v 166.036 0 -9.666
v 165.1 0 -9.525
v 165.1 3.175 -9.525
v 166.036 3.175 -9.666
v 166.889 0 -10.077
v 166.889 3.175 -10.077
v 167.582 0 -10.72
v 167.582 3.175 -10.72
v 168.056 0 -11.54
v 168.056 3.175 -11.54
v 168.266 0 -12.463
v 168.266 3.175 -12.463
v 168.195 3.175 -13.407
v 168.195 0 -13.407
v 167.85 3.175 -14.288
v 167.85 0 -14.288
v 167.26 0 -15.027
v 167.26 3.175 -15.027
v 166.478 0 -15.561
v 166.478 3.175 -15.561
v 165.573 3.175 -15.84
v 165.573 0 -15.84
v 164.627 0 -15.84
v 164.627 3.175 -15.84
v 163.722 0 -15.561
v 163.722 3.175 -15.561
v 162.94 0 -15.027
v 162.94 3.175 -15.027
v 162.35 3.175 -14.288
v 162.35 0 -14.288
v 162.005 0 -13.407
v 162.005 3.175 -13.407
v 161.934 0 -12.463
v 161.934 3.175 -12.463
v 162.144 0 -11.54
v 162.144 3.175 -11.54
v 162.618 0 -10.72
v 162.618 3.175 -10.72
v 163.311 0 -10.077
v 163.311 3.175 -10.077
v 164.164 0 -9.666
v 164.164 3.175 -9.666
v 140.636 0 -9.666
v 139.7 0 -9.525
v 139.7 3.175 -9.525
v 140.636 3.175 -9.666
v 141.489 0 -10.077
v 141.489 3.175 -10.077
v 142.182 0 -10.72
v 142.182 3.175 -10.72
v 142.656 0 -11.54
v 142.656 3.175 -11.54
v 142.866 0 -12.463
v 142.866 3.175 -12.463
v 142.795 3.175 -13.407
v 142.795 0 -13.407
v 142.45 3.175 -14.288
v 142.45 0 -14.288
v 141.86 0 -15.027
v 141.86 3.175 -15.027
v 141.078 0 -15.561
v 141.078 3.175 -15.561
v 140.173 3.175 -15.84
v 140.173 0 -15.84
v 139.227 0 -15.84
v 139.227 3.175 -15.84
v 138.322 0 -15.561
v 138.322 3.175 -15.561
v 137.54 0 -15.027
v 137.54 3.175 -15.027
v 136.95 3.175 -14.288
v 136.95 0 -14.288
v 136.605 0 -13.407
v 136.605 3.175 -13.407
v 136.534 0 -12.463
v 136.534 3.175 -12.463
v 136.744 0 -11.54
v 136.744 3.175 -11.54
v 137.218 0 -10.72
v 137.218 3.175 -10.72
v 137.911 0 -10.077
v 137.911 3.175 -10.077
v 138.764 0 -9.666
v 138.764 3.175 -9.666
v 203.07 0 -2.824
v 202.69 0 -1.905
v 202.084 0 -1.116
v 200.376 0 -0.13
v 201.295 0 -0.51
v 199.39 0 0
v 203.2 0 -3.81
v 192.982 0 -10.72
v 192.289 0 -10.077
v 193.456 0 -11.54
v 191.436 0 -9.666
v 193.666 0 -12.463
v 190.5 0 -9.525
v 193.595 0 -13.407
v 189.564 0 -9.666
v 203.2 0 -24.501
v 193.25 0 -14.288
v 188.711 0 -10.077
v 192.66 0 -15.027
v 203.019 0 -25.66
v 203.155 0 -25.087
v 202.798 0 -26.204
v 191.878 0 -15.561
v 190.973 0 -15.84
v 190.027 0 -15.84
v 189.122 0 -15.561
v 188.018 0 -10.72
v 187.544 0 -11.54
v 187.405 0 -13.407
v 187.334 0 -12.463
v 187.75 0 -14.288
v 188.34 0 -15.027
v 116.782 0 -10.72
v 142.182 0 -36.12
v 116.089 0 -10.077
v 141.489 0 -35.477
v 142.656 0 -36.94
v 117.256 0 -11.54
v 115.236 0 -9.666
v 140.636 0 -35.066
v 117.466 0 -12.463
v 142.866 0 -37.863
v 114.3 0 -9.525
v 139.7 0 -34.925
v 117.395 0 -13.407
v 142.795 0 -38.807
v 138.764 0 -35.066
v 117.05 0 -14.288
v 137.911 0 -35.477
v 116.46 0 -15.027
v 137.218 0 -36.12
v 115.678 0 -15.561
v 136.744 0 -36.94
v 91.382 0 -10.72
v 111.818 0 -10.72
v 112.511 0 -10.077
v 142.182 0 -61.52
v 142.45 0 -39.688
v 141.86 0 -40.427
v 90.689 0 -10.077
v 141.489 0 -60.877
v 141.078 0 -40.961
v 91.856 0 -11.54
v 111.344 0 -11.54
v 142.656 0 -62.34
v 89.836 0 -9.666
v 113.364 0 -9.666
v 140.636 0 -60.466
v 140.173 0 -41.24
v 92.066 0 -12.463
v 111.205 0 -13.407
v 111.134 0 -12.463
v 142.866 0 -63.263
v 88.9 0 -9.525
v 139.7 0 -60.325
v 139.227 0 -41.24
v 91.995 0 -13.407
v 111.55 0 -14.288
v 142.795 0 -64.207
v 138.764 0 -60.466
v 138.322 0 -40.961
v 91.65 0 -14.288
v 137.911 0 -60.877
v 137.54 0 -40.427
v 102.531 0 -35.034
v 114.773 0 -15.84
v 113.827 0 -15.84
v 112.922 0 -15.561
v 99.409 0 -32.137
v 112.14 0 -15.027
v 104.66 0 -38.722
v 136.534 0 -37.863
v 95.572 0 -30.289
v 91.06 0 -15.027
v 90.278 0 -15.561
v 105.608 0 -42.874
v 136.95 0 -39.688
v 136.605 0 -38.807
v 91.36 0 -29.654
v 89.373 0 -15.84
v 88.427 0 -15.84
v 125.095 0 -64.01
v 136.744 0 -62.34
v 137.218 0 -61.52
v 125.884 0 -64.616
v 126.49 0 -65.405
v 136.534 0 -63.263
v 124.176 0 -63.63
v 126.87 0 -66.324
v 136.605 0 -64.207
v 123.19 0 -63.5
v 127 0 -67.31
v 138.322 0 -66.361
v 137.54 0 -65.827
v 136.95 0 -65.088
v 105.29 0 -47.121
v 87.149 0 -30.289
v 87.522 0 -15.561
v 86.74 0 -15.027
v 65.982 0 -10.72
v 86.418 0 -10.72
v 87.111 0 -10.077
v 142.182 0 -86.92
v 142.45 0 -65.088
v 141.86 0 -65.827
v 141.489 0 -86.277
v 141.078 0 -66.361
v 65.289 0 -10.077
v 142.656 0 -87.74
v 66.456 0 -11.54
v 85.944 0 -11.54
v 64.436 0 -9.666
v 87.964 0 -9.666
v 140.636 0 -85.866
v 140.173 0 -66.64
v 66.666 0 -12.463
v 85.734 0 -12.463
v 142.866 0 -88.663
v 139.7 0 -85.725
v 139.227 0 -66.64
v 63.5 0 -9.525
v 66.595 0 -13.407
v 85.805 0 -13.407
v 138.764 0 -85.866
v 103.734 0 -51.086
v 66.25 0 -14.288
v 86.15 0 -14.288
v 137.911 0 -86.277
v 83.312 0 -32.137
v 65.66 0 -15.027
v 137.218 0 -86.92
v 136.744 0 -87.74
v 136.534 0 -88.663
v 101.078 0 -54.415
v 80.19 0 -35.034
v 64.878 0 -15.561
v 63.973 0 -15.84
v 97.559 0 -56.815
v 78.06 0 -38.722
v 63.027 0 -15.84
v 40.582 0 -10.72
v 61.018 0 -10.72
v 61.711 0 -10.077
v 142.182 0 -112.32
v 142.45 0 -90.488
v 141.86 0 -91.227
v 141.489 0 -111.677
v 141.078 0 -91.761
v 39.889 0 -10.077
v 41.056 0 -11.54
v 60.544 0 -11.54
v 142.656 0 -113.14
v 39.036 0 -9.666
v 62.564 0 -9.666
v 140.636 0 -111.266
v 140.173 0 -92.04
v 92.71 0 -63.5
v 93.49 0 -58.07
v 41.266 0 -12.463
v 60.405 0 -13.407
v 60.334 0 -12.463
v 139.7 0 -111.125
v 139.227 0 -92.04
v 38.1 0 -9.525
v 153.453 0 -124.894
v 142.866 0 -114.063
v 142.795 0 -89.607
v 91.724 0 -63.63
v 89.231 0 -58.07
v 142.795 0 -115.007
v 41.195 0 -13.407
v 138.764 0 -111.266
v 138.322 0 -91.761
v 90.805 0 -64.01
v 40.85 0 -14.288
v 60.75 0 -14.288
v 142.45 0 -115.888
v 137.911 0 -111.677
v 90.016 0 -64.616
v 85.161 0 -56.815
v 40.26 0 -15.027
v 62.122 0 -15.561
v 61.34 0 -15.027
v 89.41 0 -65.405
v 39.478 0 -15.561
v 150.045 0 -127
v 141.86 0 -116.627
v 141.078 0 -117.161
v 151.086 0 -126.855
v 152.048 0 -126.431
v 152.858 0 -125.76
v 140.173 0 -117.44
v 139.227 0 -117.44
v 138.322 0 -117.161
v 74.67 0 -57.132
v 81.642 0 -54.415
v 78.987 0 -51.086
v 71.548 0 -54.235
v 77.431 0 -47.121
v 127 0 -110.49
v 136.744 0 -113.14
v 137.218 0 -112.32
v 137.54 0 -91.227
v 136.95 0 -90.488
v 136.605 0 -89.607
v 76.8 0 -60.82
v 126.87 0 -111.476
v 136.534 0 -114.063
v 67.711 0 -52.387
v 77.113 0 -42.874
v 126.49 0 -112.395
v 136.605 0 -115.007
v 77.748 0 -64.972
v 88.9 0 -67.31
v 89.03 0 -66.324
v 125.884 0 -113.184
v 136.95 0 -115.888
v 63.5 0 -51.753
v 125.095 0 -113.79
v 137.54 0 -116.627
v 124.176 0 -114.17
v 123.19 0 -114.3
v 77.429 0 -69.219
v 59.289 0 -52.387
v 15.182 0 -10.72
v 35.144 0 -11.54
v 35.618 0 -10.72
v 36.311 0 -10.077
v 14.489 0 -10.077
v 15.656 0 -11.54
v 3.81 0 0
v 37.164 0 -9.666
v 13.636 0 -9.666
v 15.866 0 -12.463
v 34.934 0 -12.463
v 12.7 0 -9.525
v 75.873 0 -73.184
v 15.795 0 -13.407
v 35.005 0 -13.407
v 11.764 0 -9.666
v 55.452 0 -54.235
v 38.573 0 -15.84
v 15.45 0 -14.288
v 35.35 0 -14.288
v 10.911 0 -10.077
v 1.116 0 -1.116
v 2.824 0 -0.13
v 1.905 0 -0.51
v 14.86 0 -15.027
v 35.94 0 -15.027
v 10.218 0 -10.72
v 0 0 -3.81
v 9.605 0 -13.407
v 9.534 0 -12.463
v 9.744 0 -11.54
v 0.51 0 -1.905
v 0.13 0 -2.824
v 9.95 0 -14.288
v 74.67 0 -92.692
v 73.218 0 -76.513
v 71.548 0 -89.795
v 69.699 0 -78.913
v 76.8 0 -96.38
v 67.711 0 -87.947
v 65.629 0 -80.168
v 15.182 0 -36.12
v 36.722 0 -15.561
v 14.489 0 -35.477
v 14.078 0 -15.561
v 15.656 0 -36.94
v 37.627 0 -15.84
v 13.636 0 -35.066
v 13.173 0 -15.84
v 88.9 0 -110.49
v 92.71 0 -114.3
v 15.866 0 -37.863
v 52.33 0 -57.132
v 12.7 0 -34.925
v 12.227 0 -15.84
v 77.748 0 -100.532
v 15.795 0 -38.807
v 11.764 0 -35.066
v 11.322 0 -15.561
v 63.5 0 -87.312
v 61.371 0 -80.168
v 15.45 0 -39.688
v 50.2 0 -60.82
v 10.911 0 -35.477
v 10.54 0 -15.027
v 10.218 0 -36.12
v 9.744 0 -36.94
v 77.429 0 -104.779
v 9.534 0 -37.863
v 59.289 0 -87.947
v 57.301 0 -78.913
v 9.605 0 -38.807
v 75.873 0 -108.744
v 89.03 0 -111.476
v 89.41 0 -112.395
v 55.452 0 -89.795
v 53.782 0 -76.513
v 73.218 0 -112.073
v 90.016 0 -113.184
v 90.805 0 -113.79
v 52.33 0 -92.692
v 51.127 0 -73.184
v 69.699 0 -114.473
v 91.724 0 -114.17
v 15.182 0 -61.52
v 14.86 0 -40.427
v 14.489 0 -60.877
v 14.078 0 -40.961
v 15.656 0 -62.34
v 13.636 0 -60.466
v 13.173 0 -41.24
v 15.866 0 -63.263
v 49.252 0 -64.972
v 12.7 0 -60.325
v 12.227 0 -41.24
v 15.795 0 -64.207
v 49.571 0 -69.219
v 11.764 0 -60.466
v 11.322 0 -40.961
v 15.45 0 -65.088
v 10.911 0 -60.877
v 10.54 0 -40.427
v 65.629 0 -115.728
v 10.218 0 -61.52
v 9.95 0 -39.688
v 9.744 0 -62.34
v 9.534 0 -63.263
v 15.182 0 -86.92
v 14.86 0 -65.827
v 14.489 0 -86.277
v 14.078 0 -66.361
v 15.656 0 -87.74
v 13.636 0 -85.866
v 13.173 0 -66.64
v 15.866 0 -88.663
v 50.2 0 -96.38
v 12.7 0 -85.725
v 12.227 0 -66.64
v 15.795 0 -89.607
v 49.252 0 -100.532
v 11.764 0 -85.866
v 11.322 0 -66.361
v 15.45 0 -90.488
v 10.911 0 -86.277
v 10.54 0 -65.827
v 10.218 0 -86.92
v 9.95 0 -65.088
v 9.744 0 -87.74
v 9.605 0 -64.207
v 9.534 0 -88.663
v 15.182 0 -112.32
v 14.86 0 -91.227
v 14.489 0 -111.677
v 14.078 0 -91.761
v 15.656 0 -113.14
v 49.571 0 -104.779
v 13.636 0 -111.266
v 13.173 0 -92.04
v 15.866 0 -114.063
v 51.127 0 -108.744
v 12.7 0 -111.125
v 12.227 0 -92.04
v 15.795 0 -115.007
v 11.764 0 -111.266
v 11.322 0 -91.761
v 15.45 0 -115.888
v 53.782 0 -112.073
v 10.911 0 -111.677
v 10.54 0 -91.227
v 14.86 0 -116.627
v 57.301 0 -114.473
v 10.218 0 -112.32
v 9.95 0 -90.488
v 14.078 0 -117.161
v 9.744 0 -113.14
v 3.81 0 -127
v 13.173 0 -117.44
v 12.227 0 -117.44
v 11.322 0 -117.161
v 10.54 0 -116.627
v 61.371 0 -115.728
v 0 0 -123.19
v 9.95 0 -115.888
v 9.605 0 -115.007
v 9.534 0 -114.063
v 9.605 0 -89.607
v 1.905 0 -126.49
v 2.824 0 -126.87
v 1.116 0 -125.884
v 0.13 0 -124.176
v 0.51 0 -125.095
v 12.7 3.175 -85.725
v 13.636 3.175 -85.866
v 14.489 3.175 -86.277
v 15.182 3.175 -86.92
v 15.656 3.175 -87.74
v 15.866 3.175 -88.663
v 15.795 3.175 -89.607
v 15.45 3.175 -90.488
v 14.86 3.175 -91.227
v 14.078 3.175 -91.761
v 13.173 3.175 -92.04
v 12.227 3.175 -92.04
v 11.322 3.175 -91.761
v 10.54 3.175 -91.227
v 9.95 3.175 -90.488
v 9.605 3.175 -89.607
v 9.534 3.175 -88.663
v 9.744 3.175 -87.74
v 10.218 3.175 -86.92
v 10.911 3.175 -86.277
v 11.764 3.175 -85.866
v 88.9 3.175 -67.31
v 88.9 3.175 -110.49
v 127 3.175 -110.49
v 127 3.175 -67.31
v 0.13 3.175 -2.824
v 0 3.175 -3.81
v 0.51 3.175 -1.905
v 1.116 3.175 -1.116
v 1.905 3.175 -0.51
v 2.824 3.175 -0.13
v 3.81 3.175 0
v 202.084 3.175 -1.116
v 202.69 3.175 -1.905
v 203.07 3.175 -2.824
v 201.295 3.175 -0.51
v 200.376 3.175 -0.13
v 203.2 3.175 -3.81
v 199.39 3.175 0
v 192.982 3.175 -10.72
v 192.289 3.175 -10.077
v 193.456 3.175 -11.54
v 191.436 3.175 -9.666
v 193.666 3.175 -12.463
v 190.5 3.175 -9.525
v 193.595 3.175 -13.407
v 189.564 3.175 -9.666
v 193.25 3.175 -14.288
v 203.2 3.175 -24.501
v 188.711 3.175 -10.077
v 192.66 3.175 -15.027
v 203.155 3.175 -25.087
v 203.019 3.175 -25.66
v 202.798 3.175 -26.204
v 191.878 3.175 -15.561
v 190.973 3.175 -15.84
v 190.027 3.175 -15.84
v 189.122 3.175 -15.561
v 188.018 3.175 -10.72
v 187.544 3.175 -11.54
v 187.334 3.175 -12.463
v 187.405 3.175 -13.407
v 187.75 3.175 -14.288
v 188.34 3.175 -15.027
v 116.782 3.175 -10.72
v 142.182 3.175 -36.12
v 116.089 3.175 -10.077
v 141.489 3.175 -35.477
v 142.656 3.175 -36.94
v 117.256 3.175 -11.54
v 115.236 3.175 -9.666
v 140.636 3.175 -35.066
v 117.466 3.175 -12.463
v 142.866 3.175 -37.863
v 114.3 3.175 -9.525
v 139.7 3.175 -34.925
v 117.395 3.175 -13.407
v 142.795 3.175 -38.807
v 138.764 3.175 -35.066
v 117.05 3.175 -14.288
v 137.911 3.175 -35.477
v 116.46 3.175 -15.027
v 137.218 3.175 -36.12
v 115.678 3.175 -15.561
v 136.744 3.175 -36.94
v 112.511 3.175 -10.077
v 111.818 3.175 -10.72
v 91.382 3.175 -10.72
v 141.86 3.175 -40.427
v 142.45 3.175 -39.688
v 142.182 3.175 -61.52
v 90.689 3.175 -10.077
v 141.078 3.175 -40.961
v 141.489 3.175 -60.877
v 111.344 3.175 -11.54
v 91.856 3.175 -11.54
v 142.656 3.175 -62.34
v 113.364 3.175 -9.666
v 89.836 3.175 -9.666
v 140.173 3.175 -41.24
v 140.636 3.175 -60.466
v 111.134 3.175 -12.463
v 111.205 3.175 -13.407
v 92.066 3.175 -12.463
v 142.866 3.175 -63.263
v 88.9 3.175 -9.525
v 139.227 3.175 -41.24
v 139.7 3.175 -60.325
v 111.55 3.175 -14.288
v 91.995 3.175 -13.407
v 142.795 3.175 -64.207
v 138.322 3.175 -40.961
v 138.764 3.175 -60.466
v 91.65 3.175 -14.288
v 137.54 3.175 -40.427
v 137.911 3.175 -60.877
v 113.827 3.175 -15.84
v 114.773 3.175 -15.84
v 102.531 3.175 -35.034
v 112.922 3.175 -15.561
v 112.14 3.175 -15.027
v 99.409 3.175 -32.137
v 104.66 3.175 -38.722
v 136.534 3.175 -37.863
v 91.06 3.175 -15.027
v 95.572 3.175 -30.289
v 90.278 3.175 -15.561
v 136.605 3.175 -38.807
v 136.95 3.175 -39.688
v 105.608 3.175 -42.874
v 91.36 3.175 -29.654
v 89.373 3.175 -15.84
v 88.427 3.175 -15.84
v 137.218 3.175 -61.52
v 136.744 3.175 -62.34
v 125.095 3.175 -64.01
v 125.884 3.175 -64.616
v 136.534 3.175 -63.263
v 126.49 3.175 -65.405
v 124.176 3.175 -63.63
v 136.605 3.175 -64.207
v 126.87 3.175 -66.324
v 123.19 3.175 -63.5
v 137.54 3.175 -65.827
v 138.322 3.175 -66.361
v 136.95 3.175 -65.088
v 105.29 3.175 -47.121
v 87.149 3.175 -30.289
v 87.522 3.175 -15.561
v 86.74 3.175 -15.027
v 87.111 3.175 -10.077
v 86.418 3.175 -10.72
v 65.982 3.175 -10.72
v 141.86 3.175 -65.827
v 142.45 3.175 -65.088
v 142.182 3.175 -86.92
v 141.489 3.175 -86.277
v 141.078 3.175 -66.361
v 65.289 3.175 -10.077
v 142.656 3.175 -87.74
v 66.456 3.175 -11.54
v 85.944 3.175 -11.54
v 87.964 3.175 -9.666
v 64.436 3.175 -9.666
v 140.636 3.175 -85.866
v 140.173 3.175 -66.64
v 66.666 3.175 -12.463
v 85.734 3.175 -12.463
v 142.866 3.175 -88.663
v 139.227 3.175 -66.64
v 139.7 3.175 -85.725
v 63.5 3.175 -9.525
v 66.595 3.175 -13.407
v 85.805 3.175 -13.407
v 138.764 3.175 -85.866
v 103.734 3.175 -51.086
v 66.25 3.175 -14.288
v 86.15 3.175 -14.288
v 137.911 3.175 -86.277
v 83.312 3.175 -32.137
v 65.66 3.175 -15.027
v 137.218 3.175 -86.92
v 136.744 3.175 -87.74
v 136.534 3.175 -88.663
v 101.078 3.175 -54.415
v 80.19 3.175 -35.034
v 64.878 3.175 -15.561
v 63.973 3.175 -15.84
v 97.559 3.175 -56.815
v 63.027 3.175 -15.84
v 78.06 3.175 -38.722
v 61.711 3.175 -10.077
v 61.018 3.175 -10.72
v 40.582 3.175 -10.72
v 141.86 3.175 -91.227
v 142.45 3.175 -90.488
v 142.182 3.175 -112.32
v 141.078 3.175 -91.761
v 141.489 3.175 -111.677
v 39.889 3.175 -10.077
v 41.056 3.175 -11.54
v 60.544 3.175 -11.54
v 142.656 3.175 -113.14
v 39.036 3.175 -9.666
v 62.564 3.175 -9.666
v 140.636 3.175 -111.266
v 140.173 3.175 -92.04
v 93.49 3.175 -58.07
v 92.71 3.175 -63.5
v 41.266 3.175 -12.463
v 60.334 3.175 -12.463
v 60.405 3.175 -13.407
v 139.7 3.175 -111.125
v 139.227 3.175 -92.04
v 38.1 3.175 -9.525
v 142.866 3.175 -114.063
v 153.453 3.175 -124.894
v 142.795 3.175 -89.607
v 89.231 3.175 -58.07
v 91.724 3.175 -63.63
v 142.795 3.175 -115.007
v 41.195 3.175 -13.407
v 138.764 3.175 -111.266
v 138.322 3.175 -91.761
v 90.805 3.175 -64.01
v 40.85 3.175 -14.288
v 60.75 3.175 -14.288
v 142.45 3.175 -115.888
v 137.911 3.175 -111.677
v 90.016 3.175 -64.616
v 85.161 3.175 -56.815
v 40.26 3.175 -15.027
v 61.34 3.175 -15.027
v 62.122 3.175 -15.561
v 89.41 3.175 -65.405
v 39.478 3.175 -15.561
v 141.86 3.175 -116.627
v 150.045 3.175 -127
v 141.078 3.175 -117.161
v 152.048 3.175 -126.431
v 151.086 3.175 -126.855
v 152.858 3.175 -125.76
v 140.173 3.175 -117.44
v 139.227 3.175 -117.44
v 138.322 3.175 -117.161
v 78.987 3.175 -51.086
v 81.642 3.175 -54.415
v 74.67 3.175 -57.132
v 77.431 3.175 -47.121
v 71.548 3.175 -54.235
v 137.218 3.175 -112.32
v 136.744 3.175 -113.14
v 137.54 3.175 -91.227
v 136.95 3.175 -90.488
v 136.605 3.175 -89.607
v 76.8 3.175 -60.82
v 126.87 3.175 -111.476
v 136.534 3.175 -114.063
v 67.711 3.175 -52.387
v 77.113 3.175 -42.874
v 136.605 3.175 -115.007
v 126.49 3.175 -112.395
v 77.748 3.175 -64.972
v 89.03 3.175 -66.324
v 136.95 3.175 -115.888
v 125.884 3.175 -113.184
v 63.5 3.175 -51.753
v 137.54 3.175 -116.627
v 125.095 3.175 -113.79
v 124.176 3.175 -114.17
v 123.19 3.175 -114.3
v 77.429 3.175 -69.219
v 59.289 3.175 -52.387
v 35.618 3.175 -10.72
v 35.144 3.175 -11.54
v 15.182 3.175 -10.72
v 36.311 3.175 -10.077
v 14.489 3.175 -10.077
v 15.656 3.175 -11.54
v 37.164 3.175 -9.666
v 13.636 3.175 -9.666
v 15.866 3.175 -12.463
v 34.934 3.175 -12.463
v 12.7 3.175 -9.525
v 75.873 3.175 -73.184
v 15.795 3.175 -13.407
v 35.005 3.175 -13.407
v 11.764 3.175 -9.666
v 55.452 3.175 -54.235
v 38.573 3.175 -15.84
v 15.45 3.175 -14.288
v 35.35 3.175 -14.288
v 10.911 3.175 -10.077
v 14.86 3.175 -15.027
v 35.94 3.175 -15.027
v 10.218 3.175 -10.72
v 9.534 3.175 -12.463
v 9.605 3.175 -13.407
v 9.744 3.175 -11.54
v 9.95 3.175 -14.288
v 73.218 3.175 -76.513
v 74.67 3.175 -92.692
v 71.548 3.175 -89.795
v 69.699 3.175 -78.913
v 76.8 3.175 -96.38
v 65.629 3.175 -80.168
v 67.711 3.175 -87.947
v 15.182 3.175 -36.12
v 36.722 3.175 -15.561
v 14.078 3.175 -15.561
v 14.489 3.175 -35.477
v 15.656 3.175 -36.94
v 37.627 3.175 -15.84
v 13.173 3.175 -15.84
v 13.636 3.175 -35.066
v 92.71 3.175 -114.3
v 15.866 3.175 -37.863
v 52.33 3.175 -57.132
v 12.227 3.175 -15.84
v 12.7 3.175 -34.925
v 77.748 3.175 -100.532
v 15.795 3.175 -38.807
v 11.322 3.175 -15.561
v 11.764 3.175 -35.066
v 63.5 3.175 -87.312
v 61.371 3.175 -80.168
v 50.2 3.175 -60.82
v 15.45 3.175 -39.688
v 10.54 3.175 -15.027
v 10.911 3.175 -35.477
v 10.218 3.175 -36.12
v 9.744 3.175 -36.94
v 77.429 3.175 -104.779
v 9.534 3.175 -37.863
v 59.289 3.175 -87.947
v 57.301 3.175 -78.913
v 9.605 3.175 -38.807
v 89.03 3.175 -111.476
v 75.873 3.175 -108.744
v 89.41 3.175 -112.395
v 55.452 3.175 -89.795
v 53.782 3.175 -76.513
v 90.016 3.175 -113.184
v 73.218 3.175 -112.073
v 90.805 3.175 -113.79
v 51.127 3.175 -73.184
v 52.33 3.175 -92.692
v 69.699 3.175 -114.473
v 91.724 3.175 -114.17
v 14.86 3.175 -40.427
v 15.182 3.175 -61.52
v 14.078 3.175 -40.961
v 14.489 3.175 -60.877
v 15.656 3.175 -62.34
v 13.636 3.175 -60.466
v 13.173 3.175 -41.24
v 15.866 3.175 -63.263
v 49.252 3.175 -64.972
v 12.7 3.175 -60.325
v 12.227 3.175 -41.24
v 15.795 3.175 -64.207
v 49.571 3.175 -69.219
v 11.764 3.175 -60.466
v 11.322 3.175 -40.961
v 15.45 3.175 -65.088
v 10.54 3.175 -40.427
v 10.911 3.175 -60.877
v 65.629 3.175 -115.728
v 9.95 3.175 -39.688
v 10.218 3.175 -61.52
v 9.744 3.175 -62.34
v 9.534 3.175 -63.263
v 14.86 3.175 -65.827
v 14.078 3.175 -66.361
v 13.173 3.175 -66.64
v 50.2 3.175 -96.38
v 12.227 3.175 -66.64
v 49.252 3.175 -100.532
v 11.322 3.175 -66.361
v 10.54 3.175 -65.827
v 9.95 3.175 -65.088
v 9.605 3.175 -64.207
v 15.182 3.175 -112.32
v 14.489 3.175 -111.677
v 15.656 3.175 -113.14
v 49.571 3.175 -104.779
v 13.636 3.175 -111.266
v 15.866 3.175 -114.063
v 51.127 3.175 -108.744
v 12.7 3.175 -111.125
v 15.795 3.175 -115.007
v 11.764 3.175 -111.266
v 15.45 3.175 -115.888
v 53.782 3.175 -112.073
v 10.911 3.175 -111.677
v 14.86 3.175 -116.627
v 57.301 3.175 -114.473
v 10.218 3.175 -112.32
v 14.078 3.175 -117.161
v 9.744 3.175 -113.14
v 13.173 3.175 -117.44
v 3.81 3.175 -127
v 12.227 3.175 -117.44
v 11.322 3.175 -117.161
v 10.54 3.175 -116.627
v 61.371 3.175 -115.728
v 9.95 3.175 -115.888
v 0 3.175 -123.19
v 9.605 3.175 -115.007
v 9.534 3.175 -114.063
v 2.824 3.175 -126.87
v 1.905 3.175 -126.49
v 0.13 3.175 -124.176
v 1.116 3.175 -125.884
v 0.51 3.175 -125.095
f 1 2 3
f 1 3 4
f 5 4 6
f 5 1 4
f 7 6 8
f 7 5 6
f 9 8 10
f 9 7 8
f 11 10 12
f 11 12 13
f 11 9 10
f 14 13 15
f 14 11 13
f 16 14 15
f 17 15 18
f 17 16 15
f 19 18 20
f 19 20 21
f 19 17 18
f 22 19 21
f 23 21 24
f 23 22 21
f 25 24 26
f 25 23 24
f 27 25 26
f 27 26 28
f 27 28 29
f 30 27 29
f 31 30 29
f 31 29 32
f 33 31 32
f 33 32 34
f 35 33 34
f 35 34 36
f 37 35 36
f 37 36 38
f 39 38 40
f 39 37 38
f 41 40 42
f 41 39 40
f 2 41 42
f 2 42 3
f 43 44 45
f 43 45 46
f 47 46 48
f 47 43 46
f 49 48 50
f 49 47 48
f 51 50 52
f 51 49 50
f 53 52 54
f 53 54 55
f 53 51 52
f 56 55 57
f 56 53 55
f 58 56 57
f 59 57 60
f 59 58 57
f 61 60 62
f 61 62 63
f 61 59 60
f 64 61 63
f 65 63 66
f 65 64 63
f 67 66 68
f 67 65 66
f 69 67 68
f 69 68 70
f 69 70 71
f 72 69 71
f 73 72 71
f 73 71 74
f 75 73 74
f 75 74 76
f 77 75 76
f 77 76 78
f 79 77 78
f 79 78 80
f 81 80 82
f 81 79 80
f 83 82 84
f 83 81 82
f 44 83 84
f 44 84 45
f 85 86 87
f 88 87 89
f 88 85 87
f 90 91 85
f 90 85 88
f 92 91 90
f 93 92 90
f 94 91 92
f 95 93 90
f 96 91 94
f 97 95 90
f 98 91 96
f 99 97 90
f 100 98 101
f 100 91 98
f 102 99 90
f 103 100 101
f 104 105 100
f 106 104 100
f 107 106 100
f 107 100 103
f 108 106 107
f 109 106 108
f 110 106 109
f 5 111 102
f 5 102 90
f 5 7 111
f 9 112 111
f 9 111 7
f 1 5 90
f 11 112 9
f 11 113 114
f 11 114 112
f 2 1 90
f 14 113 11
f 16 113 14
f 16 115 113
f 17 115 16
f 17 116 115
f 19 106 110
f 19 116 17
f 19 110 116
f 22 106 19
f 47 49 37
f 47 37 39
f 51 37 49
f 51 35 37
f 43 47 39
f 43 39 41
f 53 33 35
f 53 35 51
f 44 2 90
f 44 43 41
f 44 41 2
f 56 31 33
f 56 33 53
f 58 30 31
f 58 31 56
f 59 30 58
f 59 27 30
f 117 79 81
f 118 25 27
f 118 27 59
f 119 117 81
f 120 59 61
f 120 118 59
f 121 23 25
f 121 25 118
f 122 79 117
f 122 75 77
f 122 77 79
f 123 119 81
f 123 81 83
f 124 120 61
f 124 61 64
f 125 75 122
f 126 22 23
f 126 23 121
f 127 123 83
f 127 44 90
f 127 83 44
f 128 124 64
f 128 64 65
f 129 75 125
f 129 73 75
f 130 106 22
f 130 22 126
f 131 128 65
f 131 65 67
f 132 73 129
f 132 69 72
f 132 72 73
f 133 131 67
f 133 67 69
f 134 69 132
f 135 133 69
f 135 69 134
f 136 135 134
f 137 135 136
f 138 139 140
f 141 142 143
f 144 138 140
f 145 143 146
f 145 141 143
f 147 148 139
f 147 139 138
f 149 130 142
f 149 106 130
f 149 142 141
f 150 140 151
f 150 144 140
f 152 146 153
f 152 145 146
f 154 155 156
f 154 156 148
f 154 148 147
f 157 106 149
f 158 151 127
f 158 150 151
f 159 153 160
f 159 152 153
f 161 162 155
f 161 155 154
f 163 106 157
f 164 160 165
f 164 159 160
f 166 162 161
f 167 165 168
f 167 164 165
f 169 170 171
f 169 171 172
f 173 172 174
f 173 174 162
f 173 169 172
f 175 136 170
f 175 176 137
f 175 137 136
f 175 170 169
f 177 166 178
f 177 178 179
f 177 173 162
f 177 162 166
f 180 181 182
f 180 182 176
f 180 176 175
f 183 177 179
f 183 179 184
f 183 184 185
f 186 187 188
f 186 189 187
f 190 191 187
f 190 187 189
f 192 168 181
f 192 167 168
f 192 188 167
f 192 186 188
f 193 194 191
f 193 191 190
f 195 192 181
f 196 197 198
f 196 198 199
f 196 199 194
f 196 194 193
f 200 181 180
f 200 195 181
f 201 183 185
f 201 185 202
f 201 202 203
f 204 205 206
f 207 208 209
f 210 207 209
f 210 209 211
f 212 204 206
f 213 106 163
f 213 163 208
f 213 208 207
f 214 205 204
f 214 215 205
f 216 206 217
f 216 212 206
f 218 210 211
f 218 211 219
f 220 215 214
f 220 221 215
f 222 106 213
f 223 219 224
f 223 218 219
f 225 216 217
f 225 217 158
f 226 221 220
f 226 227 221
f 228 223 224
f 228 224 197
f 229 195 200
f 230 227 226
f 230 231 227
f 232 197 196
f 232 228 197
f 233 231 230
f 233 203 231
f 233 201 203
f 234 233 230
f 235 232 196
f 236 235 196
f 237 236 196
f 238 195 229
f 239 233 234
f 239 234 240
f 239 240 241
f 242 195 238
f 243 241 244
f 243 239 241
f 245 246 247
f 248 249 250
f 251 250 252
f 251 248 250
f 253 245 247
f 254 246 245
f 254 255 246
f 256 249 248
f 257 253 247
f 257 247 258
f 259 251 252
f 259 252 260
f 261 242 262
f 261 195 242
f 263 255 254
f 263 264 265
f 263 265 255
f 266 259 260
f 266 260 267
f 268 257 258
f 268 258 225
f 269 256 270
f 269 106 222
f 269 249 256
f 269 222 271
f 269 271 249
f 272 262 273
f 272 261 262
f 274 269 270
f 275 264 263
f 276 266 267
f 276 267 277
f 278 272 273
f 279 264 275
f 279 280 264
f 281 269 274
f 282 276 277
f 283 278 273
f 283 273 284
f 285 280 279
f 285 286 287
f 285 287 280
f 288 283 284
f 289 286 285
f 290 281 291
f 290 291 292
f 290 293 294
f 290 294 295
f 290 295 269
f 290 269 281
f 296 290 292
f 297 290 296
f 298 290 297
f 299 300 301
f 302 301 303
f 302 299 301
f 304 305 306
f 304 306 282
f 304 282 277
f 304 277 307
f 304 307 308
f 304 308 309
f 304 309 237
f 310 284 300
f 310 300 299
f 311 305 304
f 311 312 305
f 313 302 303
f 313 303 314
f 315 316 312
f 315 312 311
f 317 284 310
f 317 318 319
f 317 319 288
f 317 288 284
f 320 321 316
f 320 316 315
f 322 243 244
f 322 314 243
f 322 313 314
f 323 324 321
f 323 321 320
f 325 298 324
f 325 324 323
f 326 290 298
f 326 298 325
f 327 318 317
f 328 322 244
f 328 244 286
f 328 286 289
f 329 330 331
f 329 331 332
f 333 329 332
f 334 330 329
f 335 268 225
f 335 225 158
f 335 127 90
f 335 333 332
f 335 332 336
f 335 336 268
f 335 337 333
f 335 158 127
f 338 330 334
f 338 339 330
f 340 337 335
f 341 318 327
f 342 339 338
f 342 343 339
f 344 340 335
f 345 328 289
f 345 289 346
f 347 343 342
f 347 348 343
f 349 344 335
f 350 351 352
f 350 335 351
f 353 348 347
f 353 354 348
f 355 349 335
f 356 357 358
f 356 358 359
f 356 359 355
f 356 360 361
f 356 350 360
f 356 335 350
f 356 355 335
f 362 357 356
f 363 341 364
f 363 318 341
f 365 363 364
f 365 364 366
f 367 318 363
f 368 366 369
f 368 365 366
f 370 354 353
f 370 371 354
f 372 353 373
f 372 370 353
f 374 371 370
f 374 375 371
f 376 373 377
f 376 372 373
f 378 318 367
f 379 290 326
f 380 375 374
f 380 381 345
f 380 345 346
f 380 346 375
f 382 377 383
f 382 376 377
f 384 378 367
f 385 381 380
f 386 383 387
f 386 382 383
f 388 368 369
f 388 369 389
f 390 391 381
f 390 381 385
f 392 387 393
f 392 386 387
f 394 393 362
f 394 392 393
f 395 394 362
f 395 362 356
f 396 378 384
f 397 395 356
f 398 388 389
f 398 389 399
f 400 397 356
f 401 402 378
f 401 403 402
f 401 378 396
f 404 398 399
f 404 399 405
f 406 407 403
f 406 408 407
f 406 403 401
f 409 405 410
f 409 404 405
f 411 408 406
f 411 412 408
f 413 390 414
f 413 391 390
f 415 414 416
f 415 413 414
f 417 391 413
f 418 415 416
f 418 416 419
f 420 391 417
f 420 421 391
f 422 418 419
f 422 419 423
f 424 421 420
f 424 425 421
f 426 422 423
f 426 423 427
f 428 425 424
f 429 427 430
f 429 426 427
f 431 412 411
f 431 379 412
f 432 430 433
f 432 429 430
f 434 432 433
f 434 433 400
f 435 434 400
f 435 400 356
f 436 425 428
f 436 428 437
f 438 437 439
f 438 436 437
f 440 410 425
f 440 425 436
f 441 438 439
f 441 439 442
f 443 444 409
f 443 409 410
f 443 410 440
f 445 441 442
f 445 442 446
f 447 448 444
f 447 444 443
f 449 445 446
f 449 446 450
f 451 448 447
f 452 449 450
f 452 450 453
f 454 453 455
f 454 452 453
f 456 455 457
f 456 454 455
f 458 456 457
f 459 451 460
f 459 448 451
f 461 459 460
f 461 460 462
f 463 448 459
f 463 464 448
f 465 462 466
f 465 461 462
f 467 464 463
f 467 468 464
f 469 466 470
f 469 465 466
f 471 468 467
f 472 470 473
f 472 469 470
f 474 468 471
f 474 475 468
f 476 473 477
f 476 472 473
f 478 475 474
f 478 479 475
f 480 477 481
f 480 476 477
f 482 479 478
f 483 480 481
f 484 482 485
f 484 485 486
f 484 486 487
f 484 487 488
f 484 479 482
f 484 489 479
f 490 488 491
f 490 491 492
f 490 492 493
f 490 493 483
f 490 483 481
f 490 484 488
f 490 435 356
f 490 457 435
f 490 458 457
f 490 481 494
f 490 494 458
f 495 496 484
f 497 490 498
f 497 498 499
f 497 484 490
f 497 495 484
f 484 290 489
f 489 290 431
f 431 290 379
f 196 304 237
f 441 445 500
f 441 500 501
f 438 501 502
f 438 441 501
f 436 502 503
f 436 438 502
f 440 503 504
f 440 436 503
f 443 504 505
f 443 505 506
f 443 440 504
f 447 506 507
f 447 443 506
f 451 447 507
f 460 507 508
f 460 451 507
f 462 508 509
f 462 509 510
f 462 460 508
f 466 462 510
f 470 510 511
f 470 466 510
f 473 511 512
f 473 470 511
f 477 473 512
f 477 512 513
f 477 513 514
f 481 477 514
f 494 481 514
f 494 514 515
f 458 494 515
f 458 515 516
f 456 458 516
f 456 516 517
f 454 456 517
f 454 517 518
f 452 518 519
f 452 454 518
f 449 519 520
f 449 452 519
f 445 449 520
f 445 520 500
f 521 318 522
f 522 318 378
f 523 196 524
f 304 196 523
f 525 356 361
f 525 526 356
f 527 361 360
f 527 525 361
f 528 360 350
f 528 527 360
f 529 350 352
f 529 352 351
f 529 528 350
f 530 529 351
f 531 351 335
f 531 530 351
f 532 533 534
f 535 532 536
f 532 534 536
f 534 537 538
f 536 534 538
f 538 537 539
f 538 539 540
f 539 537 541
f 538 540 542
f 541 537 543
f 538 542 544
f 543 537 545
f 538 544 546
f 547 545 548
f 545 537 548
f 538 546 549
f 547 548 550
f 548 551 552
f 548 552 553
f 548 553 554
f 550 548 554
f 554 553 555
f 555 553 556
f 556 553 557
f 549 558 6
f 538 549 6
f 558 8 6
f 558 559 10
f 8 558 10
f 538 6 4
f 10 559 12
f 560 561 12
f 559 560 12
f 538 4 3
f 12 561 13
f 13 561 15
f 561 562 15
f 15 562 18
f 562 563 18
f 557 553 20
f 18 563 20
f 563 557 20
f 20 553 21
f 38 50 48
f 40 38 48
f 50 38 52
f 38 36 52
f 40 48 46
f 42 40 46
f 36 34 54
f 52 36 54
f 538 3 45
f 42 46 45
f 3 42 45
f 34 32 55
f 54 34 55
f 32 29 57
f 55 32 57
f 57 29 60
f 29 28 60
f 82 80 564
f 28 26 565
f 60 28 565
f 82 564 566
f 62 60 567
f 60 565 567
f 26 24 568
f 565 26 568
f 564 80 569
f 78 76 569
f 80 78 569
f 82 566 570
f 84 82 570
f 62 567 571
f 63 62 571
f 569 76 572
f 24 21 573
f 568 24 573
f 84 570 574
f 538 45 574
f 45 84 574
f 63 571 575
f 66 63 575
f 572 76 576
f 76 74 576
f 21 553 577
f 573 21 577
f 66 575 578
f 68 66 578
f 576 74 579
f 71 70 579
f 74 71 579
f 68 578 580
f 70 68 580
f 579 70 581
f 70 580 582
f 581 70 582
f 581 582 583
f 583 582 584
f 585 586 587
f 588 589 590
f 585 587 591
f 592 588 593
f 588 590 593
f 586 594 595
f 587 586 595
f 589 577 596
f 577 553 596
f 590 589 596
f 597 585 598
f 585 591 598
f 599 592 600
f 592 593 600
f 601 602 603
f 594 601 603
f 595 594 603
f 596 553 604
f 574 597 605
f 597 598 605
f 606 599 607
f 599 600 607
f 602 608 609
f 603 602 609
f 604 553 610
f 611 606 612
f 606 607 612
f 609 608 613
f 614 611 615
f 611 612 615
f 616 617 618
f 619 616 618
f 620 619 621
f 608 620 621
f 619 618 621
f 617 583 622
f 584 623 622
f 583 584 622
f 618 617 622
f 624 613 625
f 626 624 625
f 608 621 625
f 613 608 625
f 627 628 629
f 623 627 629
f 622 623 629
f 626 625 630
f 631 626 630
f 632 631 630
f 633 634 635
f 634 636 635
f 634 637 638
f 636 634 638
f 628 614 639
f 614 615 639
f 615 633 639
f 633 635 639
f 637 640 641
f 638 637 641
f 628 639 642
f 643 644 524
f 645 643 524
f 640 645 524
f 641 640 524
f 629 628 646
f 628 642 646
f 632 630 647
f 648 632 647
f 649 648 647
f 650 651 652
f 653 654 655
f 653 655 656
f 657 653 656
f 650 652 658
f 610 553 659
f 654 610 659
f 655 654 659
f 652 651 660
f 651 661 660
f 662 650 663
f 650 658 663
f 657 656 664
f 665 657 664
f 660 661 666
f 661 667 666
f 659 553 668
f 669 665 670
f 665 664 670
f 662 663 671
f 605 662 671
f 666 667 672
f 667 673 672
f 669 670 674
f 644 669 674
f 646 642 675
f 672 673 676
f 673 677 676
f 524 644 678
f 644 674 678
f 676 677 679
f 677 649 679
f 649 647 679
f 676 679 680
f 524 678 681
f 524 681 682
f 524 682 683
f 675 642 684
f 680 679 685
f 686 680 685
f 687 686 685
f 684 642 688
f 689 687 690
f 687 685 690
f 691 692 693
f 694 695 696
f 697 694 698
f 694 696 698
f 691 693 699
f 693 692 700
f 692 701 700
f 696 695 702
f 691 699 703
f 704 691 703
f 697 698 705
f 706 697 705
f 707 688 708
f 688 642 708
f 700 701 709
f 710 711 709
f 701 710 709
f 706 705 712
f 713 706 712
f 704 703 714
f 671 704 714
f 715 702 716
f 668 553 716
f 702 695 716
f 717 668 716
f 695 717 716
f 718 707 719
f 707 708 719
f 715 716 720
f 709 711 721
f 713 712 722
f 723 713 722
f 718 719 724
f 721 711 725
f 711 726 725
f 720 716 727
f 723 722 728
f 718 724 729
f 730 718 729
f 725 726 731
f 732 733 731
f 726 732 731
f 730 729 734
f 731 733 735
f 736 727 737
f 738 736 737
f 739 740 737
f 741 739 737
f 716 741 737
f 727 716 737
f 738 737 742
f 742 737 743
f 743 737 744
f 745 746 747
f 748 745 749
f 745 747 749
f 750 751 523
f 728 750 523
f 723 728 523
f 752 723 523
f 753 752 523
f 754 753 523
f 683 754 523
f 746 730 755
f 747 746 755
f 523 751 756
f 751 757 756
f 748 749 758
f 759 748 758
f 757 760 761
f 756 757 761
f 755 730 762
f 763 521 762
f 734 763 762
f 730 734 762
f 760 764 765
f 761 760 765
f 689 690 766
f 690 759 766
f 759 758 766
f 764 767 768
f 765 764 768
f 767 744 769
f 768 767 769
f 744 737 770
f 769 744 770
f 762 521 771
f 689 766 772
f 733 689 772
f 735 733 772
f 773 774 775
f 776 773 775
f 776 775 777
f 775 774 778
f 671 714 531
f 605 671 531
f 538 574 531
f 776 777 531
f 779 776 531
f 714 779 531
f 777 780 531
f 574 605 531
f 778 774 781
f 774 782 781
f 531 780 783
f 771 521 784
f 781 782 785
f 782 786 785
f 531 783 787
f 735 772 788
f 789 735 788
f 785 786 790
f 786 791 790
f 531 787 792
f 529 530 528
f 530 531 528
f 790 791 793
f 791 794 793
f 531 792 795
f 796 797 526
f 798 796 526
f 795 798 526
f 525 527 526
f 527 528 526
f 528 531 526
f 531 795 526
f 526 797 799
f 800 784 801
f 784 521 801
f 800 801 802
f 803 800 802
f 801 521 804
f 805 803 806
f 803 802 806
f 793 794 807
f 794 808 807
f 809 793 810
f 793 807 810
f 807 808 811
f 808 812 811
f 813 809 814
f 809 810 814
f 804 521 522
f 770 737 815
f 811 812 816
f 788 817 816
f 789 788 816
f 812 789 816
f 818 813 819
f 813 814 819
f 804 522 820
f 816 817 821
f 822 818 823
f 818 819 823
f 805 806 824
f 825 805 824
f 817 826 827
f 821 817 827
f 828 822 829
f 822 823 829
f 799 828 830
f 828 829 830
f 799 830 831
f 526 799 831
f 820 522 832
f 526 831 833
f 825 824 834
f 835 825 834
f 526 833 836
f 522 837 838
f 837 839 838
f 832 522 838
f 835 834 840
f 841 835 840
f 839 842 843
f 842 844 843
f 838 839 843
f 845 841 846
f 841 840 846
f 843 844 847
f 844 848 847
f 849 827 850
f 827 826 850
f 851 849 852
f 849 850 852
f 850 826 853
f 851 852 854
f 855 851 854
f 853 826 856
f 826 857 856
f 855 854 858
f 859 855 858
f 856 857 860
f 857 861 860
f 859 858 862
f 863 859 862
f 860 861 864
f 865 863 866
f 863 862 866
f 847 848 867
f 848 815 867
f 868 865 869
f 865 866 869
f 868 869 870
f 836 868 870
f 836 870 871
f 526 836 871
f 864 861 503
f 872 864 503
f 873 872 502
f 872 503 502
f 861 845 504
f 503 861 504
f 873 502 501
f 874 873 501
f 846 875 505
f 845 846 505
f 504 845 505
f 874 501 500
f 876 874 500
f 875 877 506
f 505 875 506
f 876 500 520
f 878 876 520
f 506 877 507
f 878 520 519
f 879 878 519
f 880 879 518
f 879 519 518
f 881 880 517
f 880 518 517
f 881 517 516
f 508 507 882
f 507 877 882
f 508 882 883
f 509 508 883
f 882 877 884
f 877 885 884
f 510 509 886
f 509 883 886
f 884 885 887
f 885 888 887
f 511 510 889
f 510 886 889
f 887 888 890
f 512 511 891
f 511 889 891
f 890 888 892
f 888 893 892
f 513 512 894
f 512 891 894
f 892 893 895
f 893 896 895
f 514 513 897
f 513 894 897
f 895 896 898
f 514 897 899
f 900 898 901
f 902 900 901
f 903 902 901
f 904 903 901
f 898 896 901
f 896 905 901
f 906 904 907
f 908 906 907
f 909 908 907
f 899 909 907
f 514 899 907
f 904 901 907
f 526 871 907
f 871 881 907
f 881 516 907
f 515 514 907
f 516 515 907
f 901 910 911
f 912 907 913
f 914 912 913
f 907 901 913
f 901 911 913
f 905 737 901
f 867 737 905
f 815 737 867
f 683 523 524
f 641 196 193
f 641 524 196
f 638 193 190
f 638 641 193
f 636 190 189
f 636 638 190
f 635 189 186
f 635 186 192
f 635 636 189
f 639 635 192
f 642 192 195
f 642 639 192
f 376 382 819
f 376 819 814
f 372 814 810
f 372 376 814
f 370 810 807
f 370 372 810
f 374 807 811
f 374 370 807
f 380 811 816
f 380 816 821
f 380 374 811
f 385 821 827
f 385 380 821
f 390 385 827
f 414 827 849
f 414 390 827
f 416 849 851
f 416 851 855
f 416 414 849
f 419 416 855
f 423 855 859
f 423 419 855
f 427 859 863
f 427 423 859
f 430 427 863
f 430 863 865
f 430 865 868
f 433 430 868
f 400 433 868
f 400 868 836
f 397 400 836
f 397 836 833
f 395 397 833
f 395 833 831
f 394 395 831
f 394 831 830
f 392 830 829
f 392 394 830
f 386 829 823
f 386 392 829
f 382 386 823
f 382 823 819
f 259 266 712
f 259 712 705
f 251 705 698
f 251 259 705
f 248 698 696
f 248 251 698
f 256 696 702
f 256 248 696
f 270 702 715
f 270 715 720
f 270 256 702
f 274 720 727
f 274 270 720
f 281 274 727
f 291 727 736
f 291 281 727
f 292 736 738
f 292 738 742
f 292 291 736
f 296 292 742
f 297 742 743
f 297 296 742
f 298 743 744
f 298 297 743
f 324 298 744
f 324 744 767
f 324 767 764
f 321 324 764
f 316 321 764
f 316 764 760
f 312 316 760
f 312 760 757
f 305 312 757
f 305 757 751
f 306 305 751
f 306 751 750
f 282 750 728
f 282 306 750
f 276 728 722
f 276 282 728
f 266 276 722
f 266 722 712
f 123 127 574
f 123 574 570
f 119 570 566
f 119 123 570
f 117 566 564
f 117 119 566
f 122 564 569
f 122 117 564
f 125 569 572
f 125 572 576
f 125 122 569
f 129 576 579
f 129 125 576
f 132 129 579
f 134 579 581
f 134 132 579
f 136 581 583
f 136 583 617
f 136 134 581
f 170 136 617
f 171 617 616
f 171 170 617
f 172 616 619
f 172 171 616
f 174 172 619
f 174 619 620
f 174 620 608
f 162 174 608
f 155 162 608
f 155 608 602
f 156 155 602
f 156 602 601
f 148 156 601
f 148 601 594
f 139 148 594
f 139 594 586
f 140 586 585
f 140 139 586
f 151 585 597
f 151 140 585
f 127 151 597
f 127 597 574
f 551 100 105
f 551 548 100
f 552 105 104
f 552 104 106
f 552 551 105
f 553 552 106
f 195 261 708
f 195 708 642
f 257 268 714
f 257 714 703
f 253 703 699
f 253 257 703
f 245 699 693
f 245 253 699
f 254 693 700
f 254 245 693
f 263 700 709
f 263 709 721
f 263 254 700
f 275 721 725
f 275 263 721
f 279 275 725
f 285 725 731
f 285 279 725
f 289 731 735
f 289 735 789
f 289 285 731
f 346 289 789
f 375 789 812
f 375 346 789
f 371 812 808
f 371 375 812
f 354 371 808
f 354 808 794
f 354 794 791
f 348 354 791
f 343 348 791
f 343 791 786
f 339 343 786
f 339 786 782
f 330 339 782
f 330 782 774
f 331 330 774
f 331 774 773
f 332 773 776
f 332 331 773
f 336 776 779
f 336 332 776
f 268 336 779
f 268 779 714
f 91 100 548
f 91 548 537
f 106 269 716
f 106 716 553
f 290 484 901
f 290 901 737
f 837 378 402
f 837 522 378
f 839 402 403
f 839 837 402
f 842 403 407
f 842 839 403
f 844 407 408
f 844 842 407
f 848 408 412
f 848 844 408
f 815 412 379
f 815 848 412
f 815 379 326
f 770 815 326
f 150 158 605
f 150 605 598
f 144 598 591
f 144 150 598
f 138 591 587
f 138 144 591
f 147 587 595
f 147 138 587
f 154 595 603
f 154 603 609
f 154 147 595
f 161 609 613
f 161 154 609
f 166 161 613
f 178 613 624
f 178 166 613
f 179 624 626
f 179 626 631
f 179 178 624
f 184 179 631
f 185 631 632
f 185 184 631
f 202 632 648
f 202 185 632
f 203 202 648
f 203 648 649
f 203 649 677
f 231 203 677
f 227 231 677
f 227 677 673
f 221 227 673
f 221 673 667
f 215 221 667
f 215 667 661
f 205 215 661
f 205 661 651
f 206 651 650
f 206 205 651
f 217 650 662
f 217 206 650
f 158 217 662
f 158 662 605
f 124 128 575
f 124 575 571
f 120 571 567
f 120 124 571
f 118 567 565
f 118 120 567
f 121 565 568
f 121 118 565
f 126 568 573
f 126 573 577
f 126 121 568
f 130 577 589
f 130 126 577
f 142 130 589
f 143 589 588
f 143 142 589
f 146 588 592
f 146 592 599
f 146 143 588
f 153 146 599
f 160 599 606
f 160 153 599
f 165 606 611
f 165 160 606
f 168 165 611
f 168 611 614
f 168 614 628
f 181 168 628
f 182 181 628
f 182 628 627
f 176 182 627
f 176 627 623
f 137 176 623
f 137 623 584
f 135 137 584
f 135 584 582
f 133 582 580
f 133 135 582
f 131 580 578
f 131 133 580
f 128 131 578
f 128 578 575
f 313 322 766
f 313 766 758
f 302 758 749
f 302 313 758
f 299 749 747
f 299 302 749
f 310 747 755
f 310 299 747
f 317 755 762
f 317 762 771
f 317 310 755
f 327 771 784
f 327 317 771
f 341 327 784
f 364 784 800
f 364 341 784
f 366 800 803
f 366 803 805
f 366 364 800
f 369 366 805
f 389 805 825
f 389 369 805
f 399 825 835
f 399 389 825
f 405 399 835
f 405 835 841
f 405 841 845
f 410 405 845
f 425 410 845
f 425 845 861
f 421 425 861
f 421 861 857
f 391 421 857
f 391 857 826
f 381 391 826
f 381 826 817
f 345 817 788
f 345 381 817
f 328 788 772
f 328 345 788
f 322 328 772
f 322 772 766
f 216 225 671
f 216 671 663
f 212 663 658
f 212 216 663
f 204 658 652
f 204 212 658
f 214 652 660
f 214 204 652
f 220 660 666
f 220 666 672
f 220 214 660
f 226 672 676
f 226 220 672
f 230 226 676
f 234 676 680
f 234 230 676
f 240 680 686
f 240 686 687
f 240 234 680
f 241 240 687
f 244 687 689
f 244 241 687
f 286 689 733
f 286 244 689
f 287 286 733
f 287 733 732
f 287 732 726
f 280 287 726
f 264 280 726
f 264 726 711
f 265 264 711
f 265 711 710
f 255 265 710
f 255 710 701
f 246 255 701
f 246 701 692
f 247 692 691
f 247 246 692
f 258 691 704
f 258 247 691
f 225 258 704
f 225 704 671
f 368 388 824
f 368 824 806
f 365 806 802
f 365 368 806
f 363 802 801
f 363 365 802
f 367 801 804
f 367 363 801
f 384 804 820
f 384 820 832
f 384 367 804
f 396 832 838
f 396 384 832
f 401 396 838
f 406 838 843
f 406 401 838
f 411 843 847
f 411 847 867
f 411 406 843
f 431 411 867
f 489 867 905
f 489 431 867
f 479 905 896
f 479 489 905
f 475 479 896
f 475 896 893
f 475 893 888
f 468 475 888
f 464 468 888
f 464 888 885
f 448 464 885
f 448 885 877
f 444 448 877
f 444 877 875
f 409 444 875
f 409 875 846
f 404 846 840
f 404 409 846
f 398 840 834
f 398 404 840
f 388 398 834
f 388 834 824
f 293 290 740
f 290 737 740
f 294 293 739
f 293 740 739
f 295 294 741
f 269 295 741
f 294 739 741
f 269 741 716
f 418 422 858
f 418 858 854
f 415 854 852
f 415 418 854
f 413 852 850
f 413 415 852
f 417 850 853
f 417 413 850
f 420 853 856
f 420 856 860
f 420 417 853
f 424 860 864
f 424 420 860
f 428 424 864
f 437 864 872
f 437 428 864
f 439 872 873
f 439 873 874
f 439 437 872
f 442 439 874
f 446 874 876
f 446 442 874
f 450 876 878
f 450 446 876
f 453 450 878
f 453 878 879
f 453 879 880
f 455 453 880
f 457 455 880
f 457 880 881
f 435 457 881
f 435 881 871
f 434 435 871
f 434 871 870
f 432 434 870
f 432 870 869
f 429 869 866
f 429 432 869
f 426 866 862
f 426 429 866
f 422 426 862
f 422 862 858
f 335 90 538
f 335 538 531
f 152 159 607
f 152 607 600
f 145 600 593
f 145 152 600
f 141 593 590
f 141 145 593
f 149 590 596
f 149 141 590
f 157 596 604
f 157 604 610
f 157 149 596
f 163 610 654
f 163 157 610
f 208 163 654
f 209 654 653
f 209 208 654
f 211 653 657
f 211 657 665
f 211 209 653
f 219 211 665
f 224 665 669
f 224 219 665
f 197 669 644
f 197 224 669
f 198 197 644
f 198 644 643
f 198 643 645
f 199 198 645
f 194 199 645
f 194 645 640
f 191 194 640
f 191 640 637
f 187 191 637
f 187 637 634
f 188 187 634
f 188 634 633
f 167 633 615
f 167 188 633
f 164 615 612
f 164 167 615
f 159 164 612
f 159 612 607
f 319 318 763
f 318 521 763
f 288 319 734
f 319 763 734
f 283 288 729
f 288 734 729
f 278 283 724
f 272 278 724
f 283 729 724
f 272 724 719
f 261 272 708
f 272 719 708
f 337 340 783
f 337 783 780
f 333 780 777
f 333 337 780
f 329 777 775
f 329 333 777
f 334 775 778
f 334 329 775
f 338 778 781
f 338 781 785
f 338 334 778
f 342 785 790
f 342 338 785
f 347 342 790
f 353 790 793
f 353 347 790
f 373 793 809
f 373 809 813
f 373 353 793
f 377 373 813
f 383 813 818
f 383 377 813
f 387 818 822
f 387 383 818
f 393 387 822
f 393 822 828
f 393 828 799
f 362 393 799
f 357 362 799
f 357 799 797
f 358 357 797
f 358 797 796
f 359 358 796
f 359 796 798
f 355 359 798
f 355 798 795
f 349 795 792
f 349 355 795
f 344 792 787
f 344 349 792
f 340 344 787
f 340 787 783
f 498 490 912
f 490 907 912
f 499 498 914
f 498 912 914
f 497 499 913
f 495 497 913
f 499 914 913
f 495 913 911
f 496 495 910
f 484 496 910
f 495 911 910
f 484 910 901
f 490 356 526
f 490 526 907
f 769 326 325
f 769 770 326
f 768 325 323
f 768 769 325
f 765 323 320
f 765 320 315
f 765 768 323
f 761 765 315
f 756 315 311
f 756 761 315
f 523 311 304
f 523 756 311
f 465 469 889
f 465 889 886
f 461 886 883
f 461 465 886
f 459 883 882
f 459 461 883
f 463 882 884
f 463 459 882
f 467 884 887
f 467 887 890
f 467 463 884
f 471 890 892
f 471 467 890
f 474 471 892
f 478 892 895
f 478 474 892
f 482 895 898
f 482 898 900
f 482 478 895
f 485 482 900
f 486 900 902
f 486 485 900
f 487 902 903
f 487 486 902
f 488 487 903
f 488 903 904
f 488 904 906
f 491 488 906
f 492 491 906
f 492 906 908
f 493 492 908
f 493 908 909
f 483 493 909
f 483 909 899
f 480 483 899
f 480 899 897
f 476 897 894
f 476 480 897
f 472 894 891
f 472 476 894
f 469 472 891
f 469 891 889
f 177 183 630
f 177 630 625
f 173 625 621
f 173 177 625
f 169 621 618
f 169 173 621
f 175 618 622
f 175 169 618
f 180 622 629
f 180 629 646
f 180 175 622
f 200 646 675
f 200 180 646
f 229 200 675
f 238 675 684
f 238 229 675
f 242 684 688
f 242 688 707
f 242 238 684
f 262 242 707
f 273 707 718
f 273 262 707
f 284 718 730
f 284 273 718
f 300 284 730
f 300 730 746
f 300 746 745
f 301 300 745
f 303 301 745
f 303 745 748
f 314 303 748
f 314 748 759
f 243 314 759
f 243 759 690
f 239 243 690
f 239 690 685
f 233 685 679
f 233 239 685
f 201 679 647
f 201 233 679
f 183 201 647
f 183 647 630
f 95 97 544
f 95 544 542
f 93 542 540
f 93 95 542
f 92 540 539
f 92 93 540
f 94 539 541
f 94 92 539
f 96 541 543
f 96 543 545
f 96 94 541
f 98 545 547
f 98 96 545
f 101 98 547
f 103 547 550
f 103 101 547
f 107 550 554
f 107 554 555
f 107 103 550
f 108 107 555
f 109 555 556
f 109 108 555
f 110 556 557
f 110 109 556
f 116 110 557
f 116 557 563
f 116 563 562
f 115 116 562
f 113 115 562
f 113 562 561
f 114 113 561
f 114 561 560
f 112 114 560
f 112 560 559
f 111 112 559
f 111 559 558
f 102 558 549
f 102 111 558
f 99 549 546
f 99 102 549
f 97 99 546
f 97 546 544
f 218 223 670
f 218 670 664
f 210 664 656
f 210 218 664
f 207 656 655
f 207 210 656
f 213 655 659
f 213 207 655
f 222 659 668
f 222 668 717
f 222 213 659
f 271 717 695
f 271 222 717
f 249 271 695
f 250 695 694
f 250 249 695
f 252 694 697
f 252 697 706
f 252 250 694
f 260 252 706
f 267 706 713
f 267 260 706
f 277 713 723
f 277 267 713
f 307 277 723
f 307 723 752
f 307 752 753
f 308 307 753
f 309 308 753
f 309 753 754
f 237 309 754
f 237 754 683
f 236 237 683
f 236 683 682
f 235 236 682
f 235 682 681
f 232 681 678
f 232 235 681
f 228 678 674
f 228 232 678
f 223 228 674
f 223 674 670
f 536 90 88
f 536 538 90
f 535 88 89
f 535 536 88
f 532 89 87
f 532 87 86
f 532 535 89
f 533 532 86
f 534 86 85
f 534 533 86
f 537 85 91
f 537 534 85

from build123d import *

# Parameters (mm, degrees)
SKETCH1_R           = 14.2875
SKETCH1_R_2         = 3.175
SKETCH1_W           = 38.1
SKETCH1_H           = 50.8
BOSS_EXTRUDE1_DEPTH = 3.175
FILLET1_R           = 3.81


with BuildPart() as part:
    # Sketch1 → Boss-Extrude1 (new body)
    with BuildSketch(Plane(origin=(0, 0, 0), x_dir=(1, 0, 0), z_dir=(0, 1, 0))):
        Polygon((0, 0), (0, 127), (152.4, 127), (203.2, 25.4), (203.2, 0), align=None)
        with Locations(Location((63.5, 101.6, 0), (0, 0, 270))):
            Circle(SKETCH1_R, mode=Mode.SUBTRACT)
        with Locations(Location((63.5, 66.04, 0), (0, 0, 270))):
            Circle(SKETCH1_R, mode=Mode.SUBTRACT)
        with Locations(Location((91.360222469, 43.942, 0), (0, 0, 270))):
            Circle(SKETCH1_R, mode=Mode.SUBTRACT)
        with Locations(Location((12.7, 12.7, 0), (0, 0, 270))):
            Circle(SKETCH1_R_2, mode=Mode.SUBTRACT)
        with Locations(Location((38.1, 12.7, 0), (0, 0, 270))):
            Circle(SKETCH1_R_2, mode=Mode.SUBTRACT)
        with Locations(Location((63.5, 12.7, 0), (0, 0, 270))):
            Circle(SKETCH1_R_2, mode=Mode.SUBTRACT)
        with Locations(Location((88.9, 12.7, 0), (0, 0, 270))):
            Circle(SKETCH1_R_2, mode=Mode.SUBTRACT)
        with Locations(Location((114.3, 12.7, 0), (0, 0, 270))):
            Circle(SKETCH1_R_2, mode=Mode.SUBTRACT)
        with Locations(Location((139.7, 12.7, 0), (0, 0, 270))):
            Circle(SKETCH1_R_2, mode=Mode.SUBTRACT)
        with Locations(Location((165.1, 12.7, 0), (0, 0, 270))):
            Circle(SKETCH1_R_2, mode=Mode.SUBTRACT)
        with Locations(Location((190.5, 12.7, 0), (0, 0, 270))):
            Circle(SKETCH1_R_2, mode=Mode.SUBTRACT)
        with Locations(Location((12.7, 38.1, 0), (0, 0, 270))):
            Circle(SKETCH1_R_2, mode=Mode.SUBTRACT)
        with Locations(Location((12.7, 63.5, 0), (0, 0, 270))):
            Circle(SKETCH1_R_2, mode=Mode.SUBTRACT)
        with Locations(Location((12.7, 88.9, 0), (0, 0, 270))):
            Circle(SKETCH1_R_2, mode=Mode.SUBTRACT)
        with Locations(Location((12.7, 114.3, 0), (0, 0, 270))):
            Circle(SKETCH1_R_2, mode=Mode.SUBTRACT)
        with Locations(Location((139.7, 38.1, 0), (0, 0, 270))):
            Circle(SKETCH1_R_2, mode=Mode.SUBTRACT)
        with Locations(Location((139.7, 63.5, 0), (0, 0, 270))):
            Circle(SKETCH1_R_2, mode=Mode.SUBTRACT)
        with Locations(Location((139.7, 88.9, 0), (0, 0, 270))):
            Circle(SKETCH1_R_2, mode=Mode.SUBTRACT)
        with Locations(Location((139.7, 114.3, 0), (0, 0, 270))):
            Circle(SKETCH1_R_2, mode=Mode.SUBTRACT)
        with Locations((107.95, 88.9)):
            Rectangle(SKETCH1_W, SKETCH1_H, mode=Mode.SUBTRACT)
    extrude(amount=BOSS_EXTRUDE1_DEPTH)

    # Fillet1
    fillet1_edges = [part.edges().sort_by_distance(p)[0] for p in [
        (88.9, 1.5875, -114.3),
        (88.9, 1.5875, -63.5),
        (127, 1.5875, -63.5),
        (127, 1.5875, -114.3),
        (0, 1.5875, 0),
        (0, 1.5875, -127),
        (152.4, 1.5875, -127),
        (203.2, 1.5875, -25.4),
        (203.2, 1.5875, 0),
    ]]
    fillet(fillet1_edges, radius=FILLET1_R)


solid = part.part
